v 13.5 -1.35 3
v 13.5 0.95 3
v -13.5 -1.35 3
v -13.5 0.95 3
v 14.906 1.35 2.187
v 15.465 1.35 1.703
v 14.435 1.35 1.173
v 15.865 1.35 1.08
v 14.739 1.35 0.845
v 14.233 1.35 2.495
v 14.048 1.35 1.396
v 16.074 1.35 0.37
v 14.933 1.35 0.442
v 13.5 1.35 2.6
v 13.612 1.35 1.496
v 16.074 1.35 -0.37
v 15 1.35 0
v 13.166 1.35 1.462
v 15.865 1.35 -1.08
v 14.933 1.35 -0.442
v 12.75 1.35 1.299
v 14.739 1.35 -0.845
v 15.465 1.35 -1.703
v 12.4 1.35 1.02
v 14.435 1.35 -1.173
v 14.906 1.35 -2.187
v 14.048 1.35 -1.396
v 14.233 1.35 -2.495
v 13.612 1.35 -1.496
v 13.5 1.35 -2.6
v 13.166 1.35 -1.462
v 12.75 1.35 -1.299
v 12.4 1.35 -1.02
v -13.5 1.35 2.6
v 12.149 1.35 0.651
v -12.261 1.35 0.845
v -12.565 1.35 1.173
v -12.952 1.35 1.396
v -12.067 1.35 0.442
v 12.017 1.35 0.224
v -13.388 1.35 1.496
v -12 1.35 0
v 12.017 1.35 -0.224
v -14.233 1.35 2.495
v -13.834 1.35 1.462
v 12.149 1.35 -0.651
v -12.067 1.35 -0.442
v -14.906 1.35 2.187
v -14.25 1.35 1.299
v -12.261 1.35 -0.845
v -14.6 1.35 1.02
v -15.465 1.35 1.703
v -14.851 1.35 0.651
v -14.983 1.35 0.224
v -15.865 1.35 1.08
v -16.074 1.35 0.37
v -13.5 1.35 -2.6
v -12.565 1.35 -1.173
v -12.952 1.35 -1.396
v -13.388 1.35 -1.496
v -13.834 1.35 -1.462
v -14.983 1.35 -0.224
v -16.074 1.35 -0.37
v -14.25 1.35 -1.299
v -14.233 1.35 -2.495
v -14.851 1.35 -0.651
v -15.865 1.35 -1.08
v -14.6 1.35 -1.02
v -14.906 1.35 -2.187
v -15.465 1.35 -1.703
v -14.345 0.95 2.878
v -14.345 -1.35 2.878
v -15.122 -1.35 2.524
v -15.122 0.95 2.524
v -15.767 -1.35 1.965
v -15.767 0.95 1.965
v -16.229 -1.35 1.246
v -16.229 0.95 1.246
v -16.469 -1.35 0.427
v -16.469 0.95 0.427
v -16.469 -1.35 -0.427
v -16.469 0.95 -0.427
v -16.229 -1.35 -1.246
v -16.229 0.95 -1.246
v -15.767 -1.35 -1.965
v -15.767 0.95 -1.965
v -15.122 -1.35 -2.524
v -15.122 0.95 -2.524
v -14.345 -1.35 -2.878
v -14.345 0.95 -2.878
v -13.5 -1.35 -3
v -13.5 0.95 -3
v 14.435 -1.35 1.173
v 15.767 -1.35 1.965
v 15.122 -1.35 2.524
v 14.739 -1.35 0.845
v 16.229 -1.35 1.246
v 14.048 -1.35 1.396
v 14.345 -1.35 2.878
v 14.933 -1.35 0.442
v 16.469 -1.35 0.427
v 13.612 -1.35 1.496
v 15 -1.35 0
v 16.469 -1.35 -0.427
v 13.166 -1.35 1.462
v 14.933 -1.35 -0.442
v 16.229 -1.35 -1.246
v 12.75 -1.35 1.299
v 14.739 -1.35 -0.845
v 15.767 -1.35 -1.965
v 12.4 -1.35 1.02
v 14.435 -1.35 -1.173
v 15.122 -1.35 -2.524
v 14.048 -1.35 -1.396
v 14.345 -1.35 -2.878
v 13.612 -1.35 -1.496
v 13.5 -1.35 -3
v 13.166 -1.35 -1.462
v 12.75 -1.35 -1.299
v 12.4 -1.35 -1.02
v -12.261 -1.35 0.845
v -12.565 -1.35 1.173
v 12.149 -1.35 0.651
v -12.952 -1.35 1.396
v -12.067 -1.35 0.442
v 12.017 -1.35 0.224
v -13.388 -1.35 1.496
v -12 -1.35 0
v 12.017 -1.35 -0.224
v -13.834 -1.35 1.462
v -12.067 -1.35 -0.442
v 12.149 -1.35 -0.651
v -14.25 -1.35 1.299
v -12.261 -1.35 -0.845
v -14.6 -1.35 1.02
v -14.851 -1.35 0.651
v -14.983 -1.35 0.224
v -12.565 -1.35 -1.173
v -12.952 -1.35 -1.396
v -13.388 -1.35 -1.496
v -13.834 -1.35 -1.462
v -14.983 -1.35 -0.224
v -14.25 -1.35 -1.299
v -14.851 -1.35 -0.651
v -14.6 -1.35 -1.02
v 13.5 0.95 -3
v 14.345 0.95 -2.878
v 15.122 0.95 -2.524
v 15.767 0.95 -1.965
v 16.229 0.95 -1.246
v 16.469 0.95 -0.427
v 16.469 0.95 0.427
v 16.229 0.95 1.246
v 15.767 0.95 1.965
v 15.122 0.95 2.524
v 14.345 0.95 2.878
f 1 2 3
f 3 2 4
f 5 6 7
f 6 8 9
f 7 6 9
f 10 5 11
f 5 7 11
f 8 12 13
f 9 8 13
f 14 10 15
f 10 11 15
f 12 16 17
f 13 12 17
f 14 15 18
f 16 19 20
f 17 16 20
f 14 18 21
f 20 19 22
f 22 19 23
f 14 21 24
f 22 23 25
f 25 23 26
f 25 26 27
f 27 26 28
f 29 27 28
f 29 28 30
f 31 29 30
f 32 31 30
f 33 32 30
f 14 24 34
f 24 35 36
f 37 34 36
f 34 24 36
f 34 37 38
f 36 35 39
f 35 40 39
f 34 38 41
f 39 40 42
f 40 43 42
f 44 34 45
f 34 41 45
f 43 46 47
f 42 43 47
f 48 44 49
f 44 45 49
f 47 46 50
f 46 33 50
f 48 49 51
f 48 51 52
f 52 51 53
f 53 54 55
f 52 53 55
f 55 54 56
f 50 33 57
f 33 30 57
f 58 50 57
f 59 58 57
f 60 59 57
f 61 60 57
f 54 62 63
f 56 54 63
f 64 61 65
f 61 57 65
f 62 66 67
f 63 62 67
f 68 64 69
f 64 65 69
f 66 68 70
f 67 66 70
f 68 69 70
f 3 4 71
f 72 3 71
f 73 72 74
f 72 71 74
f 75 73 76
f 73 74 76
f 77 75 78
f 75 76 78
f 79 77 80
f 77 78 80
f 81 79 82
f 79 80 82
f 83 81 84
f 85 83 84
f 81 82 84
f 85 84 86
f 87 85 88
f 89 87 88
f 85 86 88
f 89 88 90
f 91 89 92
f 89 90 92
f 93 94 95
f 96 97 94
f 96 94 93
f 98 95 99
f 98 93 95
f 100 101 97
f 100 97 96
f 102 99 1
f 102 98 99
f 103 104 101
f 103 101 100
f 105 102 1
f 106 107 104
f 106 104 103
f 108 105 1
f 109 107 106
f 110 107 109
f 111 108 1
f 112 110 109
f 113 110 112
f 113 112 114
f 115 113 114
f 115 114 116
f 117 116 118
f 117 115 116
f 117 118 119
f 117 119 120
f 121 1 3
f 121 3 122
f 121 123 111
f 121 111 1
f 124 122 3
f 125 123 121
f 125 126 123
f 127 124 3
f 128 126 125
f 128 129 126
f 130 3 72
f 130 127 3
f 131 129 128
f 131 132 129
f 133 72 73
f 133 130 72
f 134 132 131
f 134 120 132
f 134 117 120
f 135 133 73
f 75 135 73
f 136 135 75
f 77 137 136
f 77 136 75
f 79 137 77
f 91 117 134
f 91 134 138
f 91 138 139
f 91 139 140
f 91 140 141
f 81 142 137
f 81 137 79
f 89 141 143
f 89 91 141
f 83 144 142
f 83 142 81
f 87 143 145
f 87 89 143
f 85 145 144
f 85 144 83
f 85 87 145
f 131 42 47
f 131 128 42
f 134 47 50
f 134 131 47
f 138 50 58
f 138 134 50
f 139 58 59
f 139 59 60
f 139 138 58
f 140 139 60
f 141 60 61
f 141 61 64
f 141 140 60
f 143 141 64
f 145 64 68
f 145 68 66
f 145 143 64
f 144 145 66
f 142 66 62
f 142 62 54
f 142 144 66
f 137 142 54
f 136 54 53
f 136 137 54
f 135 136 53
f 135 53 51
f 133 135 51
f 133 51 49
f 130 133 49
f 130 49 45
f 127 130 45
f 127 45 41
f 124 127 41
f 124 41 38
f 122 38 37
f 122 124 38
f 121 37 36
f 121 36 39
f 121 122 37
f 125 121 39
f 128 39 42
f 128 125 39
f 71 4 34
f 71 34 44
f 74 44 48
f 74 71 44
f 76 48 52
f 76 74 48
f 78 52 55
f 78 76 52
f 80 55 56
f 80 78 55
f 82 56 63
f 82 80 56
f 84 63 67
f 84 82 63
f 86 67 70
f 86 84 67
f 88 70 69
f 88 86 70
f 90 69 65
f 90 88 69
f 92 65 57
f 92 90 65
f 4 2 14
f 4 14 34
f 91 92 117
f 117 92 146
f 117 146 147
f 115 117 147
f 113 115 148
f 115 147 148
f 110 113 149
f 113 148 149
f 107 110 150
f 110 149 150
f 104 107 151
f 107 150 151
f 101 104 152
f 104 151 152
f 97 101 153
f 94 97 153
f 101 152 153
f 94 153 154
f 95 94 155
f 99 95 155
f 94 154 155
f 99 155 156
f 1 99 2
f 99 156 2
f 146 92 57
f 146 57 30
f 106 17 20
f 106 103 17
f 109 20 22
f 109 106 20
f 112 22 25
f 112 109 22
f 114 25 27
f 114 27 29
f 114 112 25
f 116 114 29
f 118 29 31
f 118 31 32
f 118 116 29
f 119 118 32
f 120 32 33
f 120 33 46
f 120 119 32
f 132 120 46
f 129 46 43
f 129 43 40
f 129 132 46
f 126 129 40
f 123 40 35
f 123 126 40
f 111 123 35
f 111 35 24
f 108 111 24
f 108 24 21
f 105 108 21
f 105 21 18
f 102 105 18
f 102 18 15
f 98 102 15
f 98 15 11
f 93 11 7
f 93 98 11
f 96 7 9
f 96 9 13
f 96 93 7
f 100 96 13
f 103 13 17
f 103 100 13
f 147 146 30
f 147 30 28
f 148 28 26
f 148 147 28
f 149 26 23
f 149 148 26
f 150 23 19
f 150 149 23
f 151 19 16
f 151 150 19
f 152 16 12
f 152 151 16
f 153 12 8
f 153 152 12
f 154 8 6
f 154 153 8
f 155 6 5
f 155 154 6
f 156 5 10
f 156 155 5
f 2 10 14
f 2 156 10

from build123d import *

# Parameters (mm, degrees)
SKETCH1_R           = 1.5
BOSS_EXTRUDE1_DEPTH = 1.35
CHAMFER1_SIZE       = 0.4


with BuildPart() as part:
    # Sketch1 → Boss-Extrude1 (new body, symmetric)
    with BuildSketch(Plane(origin=(0, 0, 0), x_dir=(1, 0, 0), z_dir=(0, 1, 0))):
        with BuildLine():
            Line((-13.5, 3), (13.5, 3))
            ThreePointArc((13.5, 3), (16.5, 0), (13.5, -3))
            Line((13.5, -3), (-13.5, -3))
            ThreePointArc((-13.5, -3), (-16.5, 0), (-13.5, 3))
        make_face()
        with Locations((-13.5, 0)):
            Circle(SKETCH1_R, mode=Mode.SUBTRACT)
        with Locations((13.5, 0)):
            Circle(SKETCH1_R, mode=Mode.SUBTRACT)
    extrude(amount=BOSS_EXTRUDE1_DEPTH, both=True)

    # Chamfer1
    chamfer1_edges = [part.edges().sort_by_distance(p)[0] for p in [
        (16.5, 1.35, 0),
        (0, 1.35, -3),
        (-16.5, 1.35, 0),
        (0, 1.35, 3),
    ]]
    chamfer(chamfer1_edges, length=CHAMFER1_SIZE)


solid = part.part
